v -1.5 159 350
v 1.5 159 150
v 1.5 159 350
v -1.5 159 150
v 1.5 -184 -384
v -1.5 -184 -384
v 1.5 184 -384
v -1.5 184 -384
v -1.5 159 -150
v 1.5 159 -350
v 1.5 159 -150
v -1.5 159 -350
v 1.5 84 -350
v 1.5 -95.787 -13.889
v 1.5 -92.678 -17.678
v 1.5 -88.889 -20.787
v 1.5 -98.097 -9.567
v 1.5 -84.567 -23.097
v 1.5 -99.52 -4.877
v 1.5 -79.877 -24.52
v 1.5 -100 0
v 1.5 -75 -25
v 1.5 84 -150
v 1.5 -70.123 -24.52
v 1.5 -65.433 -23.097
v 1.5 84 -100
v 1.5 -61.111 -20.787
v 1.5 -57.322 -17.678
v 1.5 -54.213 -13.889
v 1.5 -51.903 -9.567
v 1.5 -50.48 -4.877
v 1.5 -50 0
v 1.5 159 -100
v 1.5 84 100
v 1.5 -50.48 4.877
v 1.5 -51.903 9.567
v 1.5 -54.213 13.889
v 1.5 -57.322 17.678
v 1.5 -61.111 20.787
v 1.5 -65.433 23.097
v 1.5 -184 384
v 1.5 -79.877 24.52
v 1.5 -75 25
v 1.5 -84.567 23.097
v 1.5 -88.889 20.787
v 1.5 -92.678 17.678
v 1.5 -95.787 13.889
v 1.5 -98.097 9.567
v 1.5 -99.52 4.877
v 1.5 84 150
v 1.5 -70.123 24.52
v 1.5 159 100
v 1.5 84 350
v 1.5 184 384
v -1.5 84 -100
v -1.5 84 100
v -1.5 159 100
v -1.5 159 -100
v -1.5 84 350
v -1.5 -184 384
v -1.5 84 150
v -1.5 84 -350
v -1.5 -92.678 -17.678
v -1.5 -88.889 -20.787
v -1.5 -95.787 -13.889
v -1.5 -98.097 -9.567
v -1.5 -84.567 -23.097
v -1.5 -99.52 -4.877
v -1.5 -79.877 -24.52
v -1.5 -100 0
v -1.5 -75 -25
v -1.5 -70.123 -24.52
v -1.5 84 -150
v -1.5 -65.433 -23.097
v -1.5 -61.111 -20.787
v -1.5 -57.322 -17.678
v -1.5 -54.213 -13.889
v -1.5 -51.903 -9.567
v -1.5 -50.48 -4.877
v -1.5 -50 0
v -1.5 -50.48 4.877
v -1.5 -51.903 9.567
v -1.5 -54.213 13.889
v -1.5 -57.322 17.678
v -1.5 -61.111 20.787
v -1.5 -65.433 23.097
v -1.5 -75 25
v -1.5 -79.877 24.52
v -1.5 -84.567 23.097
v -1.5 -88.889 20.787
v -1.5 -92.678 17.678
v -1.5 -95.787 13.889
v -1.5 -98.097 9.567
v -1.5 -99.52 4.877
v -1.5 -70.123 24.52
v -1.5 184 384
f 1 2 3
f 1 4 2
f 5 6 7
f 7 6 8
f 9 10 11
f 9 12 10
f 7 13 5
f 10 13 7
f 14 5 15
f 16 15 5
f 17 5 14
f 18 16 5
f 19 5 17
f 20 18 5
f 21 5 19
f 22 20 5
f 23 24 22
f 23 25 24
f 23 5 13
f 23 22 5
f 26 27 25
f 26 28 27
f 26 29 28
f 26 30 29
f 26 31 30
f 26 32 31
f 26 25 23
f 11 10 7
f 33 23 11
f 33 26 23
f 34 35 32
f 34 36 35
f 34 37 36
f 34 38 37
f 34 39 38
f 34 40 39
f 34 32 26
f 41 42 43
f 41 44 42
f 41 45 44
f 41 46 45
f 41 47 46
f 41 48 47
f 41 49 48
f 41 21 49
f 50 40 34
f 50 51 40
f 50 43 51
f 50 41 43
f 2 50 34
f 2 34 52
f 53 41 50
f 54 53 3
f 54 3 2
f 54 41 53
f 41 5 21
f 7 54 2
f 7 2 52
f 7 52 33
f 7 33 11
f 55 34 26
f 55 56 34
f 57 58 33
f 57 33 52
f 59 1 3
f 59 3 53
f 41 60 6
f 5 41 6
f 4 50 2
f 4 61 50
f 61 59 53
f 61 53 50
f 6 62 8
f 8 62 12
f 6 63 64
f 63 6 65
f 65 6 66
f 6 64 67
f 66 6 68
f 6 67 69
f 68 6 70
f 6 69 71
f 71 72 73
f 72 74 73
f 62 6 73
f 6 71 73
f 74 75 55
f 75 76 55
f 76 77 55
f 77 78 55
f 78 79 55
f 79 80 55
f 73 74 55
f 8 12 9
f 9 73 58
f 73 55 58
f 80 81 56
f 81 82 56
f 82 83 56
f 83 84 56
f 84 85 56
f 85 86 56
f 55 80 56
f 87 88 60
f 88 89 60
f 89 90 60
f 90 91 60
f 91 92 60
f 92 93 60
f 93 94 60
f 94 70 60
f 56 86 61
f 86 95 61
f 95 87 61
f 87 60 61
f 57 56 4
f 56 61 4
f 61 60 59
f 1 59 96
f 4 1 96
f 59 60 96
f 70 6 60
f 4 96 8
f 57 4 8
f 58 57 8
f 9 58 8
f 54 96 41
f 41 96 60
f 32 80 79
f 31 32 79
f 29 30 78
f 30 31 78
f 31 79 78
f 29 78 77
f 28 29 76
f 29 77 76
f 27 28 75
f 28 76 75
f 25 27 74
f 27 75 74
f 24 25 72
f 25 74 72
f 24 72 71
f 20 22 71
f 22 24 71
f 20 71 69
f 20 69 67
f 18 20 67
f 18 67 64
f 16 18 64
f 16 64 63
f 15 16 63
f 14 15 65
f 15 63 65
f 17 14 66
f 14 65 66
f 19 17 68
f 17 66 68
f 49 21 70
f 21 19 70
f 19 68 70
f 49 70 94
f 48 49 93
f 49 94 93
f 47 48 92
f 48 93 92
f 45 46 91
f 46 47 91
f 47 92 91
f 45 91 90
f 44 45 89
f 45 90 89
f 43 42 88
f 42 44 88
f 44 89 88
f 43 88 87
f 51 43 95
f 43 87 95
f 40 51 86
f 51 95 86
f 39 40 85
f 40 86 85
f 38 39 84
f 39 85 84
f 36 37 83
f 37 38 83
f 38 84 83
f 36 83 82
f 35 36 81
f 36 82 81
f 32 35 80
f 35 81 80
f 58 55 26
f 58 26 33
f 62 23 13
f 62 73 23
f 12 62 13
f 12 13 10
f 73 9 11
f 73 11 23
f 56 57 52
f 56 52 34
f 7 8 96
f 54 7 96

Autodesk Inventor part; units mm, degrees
ref_plane "YZ Plane" through (0, 0, 0) normal (1, 0, 0) x (0, 1, 0)
ref_plane "XZ Plane" through (0, 0, 0) normal (0, 1, 0) x (-1, 0, 0)
ref_plane "XY Plane" through (0, 0, 0) normal (0, 0, 1) x (1, 0, 0)
sketch "Sketch1" plane through (0, 0, 0) normal (1, 0, 0) x (0, 1, 0)
  line L0 (-184, -384) -> (184, -384)
  line L1 (184, -384) -> (184, 384)
  line L2 (184, 384) -> (-184, 384)
  line L3 (-184, 384) -> (-184, -384)
  line L4 (-184, -384) -> (184, 384) construction
  line L5 (184, -384) -> (-184, 384) construction
  line L6 (159, 350) -> (84, 350)
  line L7 (84, 350) -> (84, 150)
  line L8 (84, 150) -> (159, 150)
  line L9 (159, 150) -> (159, 350)
  line L10 (159, -100) -> (159, 100)
  line L11 (159, 100) -> (84, 100)
  line L12 (84, 100) -> (84, -100)
  line L13 (84, -100) -> (159, -100)
  line L14 (159, -350) -> (159, -150)
  line L15 (159, -150) -> (84, -150)
  line L16 (84, -150) -> (84, -350)
  line L17 (84, -350) -> (159, -350)
  circle A0 centre (-75, 0) radius 25
  point P0 (0, 0)
  dimension "d0" = 768
  dimension "d1" = 368
  dimension "d2" = 200
  dimension "d3" = 75
  dimension "d4" = 34
  dimension "d5" = 25
  dimension "d8" = 250
  dimension "d17" = 75
  dimension "d18" = 50
extrude "Extrusion1" add sketch "Sketch1" along normal mid plane 3
properties part number "Posterior" material "Acrylic"
